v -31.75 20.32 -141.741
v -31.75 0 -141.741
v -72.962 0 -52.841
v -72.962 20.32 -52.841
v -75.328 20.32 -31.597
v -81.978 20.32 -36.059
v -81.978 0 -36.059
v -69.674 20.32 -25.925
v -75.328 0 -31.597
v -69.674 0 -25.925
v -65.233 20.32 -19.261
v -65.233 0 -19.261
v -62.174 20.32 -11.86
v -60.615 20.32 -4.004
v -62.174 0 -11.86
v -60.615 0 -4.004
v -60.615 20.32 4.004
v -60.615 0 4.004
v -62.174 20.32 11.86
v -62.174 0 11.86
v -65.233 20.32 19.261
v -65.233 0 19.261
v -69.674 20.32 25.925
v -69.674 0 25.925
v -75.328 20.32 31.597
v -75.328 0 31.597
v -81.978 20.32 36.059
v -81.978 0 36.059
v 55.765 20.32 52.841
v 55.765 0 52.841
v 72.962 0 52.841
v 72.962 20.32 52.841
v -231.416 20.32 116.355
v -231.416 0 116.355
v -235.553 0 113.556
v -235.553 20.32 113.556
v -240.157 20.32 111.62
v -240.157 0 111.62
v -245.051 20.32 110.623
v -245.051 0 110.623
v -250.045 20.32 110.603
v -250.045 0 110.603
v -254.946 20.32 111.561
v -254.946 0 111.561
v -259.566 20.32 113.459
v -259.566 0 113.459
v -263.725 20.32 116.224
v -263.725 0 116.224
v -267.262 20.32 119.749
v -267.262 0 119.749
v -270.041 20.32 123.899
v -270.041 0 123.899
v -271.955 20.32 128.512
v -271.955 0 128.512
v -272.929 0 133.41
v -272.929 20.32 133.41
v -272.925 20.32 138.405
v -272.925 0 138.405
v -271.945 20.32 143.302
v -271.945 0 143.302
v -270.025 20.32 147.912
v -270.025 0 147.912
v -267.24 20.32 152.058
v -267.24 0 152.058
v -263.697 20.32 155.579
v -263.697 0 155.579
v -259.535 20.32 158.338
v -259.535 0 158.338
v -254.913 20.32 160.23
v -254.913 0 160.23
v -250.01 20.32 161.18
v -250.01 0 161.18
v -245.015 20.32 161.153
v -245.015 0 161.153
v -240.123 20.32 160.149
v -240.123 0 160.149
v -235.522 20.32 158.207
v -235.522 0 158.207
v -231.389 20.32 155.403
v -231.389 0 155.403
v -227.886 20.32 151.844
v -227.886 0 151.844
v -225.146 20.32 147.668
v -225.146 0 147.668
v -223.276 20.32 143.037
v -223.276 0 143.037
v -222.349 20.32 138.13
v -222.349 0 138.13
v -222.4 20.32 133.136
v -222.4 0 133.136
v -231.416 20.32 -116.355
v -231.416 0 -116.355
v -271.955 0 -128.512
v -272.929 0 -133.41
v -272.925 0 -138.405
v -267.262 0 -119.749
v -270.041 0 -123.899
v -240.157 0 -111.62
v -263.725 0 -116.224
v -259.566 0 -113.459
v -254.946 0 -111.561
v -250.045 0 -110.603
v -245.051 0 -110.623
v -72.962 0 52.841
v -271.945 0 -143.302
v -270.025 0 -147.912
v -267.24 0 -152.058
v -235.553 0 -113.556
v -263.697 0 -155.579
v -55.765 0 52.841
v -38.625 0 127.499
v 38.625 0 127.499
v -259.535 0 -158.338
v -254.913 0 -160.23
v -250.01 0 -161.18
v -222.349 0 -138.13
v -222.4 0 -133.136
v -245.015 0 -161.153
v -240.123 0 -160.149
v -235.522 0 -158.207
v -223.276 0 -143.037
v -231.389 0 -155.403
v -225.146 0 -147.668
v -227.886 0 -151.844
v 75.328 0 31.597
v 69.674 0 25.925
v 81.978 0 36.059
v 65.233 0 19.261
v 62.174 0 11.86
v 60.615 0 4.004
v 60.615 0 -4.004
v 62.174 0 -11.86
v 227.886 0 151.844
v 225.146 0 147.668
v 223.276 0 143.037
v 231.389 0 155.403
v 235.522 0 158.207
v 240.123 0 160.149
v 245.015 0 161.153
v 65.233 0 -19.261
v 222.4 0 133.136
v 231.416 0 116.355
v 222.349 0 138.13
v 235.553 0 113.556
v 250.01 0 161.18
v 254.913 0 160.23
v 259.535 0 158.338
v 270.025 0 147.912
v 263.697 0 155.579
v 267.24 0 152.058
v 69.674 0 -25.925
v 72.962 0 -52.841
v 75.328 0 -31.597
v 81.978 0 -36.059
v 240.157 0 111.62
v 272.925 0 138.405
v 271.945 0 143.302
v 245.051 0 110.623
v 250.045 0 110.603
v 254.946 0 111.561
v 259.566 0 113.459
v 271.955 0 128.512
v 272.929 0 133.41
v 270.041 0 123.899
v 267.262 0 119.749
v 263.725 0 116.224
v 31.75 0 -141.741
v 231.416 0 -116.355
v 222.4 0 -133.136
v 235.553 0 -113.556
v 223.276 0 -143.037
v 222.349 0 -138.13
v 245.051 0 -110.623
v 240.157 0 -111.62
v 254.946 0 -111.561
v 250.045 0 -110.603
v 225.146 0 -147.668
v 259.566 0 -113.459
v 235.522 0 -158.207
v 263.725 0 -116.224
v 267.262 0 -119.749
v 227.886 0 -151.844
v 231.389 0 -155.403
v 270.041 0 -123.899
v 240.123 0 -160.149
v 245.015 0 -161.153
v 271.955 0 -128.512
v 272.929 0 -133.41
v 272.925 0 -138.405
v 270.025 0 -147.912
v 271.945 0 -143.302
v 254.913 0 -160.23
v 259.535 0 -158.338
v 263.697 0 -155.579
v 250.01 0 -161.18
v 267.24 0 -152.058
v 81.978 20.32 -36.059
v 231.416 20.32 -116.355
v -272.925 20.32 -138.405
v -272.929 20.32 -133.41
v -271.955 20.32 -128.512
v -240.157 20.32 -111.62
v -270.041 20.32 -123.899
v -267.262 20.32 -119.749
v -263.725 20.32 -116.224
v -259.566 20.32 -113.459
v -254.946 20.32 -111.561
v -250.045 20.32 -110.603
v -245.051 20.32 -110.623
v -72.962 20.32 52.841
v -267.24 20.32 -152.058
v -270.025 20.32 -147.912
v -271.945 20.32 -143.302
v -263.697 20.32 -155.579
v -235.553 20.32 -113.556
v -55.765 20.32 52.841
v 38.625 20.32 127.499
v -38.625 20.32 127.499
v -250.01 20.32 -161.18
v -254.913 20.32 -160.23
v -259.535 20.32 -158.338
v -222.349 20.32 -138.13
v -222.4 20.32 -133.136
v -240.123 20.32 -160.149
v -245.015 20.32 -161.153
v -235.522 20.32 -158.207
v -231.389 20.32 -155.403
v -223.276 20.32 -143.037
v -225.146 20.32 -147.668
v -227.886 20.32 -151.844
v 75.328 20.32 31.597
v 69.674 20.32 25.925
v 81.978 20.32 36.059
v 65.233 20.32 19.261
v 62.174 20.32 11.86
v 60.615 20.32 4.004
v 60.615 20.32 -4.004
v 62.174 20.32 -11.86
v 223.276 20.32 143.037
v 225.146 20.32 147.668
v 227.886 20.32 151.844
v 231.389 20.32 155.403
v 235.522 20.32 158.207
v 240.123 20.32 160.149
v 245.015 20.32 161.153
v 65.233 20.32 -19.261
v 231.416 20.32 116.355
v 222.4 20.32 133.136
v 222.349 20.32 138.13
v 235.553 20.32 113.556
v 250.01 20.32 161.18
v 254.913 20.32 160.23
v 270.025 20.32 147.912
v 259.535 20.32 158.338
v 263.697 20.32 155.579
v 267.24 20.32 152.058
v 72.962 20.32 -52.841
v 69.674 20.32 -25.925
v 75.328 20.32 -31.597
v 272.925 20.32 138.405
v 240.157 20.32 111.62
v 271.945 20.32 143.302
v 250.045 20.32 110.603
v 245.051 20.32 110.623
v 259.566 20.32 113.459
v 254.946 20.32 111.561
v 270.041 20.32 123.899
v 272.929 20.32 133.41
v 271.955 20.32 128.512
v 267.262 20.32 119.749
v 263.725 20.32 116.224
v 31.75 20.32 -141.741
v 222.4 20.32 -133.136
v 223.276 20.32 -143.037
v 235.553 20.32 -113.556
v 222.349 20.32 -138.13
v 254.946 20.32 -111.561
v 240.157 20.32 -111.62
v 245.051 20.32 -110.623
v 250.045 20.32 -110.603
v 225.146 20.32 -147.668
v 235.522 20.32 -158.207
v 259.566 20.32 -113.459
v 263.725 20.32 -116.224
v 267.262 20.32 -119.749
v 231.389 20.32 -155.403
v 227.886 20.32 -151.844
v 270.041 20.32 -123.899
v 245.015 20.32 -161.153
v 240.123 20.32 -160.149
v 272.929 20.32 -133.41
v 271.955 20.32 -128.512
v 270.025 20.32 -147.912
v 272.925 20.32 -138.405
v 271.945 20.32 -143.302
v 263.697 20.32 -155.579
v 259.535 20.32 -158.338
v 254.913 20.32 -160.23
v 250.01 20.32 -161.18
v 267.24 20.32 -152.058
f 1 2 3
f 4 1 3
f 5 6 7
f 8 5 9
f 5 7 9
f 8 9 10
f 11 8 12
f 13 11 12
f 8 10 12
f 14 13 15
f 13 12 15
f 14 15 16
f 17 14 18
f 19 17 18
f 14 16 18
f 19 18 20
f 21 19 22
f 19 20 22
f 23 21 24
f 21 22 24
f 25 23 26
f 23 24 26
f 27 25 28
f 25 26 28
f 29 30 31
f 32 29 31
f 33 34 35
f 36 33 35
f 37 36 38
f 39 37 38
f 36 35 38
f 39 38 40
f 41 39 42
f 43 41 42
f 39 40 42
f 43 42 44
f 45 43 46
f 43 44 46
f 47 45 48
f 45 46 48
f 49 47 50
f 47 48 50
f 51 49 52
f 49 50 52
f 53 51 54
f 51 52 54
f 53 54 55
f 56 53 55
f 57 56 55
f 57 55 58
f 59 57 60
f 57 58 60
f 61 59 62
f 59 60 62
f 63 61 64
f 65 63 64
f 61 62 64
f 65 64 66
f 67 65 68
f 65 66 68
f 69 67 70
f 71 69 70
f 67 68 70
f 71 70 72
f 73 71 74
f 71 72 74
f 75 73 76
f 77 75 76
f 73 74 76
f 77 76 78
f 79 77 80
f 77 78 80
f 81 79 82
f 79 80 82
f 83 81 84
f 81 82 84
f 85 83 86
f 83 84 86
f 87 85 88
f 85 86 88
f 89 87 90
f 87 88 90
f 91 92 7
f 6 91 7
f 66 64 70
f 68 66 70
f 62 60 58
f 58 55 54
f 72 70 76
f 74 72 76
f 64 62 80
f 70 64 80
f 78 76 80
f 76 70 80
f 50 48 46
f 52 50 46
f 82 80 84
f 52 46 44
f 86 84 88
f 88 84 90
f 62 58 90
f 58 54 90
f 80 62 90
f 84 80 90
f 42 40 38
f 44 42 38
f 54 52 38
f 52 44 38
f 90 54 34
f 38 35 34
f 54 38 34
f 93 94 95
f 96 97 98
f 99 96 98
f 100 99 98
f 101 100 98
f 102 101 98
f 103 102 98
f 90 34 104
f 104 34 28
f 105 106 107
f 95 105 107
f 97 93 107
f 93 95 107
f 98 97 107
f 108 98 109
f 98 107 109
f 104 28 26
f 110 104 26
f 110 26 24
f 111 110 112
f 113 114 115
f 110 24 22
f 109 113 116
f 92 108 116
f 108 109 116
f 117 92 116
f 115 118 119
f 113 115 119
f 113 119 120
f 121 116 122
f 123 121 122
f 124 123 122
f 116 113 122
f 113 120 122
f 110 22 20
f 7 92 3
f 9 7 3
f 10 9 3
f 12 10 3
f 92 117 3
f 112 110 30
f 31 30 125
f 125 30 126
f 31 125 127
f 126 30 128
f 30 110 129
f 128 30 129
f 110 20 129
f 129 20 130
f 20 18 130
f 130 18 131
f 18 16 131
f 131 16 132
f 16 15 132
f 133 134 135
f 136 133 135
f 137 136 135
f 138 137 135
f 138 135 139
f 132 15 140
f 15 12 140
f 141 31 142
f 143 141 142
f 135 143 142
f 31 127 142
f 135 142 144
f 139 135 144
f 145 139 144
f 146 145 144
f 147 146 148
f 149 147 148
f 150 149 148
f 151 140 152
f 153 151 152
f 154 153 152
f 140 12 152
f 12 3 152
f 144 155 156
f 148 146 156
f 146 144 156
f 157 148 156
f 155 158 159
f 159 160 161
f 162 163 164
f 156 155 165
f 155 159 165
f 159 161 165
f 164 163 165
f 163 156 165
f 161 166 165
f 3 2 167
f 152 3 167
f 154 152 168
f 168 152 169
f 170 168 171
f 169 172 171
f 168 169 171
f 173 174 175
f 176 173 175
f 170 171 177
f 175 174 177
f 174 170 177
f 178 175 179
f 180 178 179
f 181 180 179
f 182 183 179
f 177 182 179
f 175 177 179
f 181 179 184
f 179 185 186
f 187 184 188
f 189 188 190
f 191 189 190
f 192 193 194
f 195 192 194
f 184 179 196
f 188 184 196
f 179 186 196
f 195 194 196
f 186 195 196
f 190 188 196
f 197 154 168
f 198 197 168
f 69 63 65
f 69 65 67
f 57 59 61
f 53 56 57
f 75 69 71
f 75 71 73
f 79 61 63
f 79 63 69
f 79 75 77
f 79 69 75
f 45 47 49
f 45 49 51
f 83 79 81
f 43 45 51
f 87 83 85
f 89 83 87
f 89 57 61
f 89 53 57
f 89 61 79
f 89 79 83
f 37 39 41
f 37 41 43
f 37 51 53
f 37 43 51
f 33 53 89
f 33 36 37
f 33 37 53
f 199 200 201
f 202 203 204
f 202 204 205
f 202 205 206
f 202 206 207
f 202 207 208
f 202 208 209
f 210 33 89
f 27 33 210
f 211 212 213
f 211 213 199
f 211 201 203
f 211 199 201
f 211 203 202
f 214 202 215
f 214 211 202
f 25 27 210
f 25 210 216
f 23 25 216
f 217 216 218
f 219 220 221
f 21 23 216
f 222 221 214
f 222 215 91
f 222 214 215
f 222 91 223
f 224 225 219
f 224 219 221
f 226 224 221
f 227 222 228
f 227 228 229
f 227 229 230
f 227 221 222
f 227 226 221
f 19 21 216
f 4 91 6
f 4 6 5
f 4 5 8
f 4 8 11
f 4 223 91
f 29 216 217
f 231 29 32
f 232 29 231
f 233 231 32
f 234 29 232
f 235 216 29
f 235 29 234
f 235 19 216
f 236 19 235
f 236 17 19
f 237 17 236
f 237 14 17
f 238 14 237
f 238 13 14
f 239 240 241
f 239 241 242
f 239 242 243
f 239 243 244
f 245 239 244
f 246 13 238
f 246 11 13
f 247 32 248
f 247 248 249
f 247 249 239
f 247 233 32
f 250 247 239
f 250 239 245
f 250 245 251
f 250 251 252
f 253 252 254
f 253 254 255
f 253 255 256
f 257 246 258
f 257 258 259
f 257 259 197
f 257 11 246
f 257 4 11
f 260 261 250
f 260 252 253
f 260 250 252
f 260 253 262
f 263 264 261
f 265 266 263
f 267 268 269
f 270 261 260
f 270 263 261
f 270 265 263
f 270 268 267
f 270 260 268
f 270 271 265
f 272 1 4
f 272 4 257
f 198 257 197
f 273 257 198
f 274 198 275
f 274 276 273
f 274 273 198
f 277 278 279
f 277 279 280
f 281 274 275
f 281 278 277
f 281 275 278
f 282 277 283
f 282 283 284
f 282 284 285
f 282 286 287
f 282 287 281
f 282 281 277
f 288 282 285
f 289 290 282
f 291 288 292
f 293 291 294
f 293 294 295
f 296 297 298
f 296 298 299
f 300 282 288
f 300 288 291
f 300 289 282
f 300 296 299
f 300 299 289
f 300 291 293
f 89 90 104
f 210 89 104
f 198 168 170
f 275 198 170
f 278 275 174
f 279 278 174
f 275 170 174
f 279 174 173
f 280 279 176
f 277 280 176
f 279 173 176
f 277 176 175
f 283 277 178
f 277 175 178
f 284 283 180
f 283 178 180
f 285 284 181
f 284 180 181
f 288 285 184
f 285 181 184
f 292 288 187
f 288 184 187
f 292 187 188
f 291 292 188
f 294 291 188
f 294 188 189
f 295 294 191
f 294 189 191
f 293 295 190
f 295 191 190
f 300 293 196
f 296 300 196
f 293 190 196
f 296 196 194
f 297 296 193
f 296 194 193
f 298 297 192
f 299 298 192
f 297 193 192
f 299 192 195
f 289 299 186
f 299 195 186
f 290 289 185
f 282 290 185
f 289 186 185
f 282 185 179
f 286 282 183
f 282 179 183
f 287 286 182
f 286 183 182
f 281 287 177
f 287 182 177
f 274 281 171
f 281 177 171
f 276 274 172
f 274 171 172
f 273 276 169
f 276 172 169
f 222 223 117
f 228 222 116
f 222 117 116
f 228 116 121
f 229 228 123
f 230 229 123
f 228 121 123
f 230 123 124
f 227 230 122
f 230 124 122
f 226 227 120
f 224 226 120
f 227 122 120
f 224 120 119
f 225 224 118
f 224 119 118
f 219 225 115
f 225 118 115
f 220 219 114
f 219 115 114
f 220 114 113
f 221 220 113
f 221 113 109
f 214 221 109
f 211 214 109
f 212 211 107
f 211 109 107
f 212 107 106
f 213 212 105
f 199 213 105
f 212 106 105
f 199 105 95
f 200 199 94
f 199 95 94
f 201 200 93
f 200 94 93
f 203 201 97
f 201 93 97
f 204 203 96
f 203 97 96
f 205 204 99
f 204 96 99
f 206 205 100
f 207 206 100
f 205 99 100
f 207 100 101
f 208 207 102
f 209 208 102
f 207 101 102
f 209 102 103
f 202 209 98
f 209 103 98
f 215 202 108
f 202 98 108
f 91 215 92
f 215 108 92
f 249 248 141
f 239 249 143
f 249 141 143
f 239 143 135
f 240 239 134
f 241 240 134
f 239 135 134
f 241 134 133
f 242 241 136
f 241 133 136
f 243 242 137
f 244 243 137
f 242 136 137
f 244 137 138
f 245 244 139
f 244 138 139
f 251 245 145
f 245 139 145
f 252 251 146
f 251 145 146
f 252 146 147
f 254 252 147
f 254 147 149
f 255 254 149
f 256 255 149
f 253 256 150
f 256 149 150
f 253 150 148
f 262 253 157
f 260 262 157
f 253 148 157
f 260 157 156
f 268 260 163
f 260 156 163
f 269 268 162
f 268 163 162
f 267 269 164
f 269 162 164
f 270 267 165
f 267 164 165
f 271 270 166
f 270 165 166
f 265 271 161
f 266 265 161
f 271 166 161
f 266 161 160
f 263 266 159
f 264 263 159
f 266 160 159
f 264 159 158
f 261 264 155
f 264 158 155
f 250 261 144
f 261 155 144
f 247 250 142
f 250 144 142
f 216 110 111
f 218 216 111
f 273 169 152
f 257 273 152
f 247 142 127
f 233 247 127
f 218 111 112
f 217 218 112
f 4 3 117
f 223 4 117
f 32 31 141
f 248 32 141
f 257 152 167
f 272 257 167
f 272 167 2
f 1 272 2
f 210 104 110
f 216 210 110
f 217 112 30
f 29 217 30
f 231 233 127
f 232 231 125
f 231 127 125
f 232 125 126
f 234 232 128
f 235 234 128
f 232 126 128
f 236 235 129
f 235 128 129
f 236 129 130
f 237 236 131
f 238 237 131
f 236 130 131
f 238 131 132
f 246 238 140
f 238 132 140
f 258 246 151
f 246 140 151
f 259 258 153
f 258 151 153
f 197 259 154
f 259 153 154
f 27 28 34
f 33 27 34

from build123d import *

# Parameters (mm, degrees)
BOSS_EXTRUDE1_DEPTH = 20.32


with BuildPart() as part:
    # Sketch1 → Boss-Extrude1 (new body)
    with BuildSketch(Plane(origin=(0, 0, 0), x_dir=(1, 0, 0), z_dir=(0, 1, 0))):
        with BuildLine():
            Line((-72.961668905, 52.840505094), (-222.399785176, 133.135612345))
            ThreePointArc((-222.399785176, 133.135612345), (-270.024680251, 147.912216254), (-231.416447367, 116.354602156))
            Line((-231.416447367, 116.354602156), (-81.978331095, 36.059494906))
            ThreePointArc((-81.978331095, 36.059494906), (-60.41841965, 0), (-81.978331095, -36.059494906))
            Line((-81.978331095, -36.059494906), (-231.416447367, -116.354602156))
            ThreePointArc((-231.416447367, -116.354602156), (-270.024680251, -147.912216254), (-222.399785176, -133.135612345))
            Line((-222.399785176, -133.135612345), (-72.961668905, -52.840505094))
            Line((-72.961668905, -52.840505094), (-55.765211733, -52.840505094))
            Line((-55.765211733, -52.840505094), (-38.625312425, -127.499494906))
            Line((-38.625312425, -127.499494906), (0, -127.499494906))
            Line((0, -127.499494906), (38.625312425, -127.499494906))
            Line((38.625312425, -127.499494906), (55.765211733, -52.840505094))
            Line((55.765211733, -52.840505094), (72.961668905, -52.840505094))
            Line((72.961668905, -52.840505094), (222.399785176, -133.135612345))
            ThreePointArc((222.399785176, -133.135612345), (270.024680251, -147.912216254), (231.416447367, -116.354602156))
            Line((231.416447367, -116.354602156), (81.978331095, -36.059494906))
            ThreePointArc((81.978331095, -36.059494906), (60.41841965, 0), (81.978331095, 36.059494906))
            Line((81.978331095, 36.059494906), (231.416447367, 116.354602156))
            ThreePointArc((231.416447367, 116.354602156), (270.024680251, 147.912216254), (222.399785176, 133.135612345))
            Line((222.399785176, 133.135612345), (72.961668905, 52.840505094))
            Line((72.961668905, 52.840505094), (31.75, 141.740505094))
            Line((31.75, 141.740505094), (-31.75, 141.740505094))
            Line((-31.75, 141.740505094), (-72.961668905, 52.840505094))
        make_face()
    extrude(amount=BOSS_EXTRUDE1_DEPTH)


solid = part.part
